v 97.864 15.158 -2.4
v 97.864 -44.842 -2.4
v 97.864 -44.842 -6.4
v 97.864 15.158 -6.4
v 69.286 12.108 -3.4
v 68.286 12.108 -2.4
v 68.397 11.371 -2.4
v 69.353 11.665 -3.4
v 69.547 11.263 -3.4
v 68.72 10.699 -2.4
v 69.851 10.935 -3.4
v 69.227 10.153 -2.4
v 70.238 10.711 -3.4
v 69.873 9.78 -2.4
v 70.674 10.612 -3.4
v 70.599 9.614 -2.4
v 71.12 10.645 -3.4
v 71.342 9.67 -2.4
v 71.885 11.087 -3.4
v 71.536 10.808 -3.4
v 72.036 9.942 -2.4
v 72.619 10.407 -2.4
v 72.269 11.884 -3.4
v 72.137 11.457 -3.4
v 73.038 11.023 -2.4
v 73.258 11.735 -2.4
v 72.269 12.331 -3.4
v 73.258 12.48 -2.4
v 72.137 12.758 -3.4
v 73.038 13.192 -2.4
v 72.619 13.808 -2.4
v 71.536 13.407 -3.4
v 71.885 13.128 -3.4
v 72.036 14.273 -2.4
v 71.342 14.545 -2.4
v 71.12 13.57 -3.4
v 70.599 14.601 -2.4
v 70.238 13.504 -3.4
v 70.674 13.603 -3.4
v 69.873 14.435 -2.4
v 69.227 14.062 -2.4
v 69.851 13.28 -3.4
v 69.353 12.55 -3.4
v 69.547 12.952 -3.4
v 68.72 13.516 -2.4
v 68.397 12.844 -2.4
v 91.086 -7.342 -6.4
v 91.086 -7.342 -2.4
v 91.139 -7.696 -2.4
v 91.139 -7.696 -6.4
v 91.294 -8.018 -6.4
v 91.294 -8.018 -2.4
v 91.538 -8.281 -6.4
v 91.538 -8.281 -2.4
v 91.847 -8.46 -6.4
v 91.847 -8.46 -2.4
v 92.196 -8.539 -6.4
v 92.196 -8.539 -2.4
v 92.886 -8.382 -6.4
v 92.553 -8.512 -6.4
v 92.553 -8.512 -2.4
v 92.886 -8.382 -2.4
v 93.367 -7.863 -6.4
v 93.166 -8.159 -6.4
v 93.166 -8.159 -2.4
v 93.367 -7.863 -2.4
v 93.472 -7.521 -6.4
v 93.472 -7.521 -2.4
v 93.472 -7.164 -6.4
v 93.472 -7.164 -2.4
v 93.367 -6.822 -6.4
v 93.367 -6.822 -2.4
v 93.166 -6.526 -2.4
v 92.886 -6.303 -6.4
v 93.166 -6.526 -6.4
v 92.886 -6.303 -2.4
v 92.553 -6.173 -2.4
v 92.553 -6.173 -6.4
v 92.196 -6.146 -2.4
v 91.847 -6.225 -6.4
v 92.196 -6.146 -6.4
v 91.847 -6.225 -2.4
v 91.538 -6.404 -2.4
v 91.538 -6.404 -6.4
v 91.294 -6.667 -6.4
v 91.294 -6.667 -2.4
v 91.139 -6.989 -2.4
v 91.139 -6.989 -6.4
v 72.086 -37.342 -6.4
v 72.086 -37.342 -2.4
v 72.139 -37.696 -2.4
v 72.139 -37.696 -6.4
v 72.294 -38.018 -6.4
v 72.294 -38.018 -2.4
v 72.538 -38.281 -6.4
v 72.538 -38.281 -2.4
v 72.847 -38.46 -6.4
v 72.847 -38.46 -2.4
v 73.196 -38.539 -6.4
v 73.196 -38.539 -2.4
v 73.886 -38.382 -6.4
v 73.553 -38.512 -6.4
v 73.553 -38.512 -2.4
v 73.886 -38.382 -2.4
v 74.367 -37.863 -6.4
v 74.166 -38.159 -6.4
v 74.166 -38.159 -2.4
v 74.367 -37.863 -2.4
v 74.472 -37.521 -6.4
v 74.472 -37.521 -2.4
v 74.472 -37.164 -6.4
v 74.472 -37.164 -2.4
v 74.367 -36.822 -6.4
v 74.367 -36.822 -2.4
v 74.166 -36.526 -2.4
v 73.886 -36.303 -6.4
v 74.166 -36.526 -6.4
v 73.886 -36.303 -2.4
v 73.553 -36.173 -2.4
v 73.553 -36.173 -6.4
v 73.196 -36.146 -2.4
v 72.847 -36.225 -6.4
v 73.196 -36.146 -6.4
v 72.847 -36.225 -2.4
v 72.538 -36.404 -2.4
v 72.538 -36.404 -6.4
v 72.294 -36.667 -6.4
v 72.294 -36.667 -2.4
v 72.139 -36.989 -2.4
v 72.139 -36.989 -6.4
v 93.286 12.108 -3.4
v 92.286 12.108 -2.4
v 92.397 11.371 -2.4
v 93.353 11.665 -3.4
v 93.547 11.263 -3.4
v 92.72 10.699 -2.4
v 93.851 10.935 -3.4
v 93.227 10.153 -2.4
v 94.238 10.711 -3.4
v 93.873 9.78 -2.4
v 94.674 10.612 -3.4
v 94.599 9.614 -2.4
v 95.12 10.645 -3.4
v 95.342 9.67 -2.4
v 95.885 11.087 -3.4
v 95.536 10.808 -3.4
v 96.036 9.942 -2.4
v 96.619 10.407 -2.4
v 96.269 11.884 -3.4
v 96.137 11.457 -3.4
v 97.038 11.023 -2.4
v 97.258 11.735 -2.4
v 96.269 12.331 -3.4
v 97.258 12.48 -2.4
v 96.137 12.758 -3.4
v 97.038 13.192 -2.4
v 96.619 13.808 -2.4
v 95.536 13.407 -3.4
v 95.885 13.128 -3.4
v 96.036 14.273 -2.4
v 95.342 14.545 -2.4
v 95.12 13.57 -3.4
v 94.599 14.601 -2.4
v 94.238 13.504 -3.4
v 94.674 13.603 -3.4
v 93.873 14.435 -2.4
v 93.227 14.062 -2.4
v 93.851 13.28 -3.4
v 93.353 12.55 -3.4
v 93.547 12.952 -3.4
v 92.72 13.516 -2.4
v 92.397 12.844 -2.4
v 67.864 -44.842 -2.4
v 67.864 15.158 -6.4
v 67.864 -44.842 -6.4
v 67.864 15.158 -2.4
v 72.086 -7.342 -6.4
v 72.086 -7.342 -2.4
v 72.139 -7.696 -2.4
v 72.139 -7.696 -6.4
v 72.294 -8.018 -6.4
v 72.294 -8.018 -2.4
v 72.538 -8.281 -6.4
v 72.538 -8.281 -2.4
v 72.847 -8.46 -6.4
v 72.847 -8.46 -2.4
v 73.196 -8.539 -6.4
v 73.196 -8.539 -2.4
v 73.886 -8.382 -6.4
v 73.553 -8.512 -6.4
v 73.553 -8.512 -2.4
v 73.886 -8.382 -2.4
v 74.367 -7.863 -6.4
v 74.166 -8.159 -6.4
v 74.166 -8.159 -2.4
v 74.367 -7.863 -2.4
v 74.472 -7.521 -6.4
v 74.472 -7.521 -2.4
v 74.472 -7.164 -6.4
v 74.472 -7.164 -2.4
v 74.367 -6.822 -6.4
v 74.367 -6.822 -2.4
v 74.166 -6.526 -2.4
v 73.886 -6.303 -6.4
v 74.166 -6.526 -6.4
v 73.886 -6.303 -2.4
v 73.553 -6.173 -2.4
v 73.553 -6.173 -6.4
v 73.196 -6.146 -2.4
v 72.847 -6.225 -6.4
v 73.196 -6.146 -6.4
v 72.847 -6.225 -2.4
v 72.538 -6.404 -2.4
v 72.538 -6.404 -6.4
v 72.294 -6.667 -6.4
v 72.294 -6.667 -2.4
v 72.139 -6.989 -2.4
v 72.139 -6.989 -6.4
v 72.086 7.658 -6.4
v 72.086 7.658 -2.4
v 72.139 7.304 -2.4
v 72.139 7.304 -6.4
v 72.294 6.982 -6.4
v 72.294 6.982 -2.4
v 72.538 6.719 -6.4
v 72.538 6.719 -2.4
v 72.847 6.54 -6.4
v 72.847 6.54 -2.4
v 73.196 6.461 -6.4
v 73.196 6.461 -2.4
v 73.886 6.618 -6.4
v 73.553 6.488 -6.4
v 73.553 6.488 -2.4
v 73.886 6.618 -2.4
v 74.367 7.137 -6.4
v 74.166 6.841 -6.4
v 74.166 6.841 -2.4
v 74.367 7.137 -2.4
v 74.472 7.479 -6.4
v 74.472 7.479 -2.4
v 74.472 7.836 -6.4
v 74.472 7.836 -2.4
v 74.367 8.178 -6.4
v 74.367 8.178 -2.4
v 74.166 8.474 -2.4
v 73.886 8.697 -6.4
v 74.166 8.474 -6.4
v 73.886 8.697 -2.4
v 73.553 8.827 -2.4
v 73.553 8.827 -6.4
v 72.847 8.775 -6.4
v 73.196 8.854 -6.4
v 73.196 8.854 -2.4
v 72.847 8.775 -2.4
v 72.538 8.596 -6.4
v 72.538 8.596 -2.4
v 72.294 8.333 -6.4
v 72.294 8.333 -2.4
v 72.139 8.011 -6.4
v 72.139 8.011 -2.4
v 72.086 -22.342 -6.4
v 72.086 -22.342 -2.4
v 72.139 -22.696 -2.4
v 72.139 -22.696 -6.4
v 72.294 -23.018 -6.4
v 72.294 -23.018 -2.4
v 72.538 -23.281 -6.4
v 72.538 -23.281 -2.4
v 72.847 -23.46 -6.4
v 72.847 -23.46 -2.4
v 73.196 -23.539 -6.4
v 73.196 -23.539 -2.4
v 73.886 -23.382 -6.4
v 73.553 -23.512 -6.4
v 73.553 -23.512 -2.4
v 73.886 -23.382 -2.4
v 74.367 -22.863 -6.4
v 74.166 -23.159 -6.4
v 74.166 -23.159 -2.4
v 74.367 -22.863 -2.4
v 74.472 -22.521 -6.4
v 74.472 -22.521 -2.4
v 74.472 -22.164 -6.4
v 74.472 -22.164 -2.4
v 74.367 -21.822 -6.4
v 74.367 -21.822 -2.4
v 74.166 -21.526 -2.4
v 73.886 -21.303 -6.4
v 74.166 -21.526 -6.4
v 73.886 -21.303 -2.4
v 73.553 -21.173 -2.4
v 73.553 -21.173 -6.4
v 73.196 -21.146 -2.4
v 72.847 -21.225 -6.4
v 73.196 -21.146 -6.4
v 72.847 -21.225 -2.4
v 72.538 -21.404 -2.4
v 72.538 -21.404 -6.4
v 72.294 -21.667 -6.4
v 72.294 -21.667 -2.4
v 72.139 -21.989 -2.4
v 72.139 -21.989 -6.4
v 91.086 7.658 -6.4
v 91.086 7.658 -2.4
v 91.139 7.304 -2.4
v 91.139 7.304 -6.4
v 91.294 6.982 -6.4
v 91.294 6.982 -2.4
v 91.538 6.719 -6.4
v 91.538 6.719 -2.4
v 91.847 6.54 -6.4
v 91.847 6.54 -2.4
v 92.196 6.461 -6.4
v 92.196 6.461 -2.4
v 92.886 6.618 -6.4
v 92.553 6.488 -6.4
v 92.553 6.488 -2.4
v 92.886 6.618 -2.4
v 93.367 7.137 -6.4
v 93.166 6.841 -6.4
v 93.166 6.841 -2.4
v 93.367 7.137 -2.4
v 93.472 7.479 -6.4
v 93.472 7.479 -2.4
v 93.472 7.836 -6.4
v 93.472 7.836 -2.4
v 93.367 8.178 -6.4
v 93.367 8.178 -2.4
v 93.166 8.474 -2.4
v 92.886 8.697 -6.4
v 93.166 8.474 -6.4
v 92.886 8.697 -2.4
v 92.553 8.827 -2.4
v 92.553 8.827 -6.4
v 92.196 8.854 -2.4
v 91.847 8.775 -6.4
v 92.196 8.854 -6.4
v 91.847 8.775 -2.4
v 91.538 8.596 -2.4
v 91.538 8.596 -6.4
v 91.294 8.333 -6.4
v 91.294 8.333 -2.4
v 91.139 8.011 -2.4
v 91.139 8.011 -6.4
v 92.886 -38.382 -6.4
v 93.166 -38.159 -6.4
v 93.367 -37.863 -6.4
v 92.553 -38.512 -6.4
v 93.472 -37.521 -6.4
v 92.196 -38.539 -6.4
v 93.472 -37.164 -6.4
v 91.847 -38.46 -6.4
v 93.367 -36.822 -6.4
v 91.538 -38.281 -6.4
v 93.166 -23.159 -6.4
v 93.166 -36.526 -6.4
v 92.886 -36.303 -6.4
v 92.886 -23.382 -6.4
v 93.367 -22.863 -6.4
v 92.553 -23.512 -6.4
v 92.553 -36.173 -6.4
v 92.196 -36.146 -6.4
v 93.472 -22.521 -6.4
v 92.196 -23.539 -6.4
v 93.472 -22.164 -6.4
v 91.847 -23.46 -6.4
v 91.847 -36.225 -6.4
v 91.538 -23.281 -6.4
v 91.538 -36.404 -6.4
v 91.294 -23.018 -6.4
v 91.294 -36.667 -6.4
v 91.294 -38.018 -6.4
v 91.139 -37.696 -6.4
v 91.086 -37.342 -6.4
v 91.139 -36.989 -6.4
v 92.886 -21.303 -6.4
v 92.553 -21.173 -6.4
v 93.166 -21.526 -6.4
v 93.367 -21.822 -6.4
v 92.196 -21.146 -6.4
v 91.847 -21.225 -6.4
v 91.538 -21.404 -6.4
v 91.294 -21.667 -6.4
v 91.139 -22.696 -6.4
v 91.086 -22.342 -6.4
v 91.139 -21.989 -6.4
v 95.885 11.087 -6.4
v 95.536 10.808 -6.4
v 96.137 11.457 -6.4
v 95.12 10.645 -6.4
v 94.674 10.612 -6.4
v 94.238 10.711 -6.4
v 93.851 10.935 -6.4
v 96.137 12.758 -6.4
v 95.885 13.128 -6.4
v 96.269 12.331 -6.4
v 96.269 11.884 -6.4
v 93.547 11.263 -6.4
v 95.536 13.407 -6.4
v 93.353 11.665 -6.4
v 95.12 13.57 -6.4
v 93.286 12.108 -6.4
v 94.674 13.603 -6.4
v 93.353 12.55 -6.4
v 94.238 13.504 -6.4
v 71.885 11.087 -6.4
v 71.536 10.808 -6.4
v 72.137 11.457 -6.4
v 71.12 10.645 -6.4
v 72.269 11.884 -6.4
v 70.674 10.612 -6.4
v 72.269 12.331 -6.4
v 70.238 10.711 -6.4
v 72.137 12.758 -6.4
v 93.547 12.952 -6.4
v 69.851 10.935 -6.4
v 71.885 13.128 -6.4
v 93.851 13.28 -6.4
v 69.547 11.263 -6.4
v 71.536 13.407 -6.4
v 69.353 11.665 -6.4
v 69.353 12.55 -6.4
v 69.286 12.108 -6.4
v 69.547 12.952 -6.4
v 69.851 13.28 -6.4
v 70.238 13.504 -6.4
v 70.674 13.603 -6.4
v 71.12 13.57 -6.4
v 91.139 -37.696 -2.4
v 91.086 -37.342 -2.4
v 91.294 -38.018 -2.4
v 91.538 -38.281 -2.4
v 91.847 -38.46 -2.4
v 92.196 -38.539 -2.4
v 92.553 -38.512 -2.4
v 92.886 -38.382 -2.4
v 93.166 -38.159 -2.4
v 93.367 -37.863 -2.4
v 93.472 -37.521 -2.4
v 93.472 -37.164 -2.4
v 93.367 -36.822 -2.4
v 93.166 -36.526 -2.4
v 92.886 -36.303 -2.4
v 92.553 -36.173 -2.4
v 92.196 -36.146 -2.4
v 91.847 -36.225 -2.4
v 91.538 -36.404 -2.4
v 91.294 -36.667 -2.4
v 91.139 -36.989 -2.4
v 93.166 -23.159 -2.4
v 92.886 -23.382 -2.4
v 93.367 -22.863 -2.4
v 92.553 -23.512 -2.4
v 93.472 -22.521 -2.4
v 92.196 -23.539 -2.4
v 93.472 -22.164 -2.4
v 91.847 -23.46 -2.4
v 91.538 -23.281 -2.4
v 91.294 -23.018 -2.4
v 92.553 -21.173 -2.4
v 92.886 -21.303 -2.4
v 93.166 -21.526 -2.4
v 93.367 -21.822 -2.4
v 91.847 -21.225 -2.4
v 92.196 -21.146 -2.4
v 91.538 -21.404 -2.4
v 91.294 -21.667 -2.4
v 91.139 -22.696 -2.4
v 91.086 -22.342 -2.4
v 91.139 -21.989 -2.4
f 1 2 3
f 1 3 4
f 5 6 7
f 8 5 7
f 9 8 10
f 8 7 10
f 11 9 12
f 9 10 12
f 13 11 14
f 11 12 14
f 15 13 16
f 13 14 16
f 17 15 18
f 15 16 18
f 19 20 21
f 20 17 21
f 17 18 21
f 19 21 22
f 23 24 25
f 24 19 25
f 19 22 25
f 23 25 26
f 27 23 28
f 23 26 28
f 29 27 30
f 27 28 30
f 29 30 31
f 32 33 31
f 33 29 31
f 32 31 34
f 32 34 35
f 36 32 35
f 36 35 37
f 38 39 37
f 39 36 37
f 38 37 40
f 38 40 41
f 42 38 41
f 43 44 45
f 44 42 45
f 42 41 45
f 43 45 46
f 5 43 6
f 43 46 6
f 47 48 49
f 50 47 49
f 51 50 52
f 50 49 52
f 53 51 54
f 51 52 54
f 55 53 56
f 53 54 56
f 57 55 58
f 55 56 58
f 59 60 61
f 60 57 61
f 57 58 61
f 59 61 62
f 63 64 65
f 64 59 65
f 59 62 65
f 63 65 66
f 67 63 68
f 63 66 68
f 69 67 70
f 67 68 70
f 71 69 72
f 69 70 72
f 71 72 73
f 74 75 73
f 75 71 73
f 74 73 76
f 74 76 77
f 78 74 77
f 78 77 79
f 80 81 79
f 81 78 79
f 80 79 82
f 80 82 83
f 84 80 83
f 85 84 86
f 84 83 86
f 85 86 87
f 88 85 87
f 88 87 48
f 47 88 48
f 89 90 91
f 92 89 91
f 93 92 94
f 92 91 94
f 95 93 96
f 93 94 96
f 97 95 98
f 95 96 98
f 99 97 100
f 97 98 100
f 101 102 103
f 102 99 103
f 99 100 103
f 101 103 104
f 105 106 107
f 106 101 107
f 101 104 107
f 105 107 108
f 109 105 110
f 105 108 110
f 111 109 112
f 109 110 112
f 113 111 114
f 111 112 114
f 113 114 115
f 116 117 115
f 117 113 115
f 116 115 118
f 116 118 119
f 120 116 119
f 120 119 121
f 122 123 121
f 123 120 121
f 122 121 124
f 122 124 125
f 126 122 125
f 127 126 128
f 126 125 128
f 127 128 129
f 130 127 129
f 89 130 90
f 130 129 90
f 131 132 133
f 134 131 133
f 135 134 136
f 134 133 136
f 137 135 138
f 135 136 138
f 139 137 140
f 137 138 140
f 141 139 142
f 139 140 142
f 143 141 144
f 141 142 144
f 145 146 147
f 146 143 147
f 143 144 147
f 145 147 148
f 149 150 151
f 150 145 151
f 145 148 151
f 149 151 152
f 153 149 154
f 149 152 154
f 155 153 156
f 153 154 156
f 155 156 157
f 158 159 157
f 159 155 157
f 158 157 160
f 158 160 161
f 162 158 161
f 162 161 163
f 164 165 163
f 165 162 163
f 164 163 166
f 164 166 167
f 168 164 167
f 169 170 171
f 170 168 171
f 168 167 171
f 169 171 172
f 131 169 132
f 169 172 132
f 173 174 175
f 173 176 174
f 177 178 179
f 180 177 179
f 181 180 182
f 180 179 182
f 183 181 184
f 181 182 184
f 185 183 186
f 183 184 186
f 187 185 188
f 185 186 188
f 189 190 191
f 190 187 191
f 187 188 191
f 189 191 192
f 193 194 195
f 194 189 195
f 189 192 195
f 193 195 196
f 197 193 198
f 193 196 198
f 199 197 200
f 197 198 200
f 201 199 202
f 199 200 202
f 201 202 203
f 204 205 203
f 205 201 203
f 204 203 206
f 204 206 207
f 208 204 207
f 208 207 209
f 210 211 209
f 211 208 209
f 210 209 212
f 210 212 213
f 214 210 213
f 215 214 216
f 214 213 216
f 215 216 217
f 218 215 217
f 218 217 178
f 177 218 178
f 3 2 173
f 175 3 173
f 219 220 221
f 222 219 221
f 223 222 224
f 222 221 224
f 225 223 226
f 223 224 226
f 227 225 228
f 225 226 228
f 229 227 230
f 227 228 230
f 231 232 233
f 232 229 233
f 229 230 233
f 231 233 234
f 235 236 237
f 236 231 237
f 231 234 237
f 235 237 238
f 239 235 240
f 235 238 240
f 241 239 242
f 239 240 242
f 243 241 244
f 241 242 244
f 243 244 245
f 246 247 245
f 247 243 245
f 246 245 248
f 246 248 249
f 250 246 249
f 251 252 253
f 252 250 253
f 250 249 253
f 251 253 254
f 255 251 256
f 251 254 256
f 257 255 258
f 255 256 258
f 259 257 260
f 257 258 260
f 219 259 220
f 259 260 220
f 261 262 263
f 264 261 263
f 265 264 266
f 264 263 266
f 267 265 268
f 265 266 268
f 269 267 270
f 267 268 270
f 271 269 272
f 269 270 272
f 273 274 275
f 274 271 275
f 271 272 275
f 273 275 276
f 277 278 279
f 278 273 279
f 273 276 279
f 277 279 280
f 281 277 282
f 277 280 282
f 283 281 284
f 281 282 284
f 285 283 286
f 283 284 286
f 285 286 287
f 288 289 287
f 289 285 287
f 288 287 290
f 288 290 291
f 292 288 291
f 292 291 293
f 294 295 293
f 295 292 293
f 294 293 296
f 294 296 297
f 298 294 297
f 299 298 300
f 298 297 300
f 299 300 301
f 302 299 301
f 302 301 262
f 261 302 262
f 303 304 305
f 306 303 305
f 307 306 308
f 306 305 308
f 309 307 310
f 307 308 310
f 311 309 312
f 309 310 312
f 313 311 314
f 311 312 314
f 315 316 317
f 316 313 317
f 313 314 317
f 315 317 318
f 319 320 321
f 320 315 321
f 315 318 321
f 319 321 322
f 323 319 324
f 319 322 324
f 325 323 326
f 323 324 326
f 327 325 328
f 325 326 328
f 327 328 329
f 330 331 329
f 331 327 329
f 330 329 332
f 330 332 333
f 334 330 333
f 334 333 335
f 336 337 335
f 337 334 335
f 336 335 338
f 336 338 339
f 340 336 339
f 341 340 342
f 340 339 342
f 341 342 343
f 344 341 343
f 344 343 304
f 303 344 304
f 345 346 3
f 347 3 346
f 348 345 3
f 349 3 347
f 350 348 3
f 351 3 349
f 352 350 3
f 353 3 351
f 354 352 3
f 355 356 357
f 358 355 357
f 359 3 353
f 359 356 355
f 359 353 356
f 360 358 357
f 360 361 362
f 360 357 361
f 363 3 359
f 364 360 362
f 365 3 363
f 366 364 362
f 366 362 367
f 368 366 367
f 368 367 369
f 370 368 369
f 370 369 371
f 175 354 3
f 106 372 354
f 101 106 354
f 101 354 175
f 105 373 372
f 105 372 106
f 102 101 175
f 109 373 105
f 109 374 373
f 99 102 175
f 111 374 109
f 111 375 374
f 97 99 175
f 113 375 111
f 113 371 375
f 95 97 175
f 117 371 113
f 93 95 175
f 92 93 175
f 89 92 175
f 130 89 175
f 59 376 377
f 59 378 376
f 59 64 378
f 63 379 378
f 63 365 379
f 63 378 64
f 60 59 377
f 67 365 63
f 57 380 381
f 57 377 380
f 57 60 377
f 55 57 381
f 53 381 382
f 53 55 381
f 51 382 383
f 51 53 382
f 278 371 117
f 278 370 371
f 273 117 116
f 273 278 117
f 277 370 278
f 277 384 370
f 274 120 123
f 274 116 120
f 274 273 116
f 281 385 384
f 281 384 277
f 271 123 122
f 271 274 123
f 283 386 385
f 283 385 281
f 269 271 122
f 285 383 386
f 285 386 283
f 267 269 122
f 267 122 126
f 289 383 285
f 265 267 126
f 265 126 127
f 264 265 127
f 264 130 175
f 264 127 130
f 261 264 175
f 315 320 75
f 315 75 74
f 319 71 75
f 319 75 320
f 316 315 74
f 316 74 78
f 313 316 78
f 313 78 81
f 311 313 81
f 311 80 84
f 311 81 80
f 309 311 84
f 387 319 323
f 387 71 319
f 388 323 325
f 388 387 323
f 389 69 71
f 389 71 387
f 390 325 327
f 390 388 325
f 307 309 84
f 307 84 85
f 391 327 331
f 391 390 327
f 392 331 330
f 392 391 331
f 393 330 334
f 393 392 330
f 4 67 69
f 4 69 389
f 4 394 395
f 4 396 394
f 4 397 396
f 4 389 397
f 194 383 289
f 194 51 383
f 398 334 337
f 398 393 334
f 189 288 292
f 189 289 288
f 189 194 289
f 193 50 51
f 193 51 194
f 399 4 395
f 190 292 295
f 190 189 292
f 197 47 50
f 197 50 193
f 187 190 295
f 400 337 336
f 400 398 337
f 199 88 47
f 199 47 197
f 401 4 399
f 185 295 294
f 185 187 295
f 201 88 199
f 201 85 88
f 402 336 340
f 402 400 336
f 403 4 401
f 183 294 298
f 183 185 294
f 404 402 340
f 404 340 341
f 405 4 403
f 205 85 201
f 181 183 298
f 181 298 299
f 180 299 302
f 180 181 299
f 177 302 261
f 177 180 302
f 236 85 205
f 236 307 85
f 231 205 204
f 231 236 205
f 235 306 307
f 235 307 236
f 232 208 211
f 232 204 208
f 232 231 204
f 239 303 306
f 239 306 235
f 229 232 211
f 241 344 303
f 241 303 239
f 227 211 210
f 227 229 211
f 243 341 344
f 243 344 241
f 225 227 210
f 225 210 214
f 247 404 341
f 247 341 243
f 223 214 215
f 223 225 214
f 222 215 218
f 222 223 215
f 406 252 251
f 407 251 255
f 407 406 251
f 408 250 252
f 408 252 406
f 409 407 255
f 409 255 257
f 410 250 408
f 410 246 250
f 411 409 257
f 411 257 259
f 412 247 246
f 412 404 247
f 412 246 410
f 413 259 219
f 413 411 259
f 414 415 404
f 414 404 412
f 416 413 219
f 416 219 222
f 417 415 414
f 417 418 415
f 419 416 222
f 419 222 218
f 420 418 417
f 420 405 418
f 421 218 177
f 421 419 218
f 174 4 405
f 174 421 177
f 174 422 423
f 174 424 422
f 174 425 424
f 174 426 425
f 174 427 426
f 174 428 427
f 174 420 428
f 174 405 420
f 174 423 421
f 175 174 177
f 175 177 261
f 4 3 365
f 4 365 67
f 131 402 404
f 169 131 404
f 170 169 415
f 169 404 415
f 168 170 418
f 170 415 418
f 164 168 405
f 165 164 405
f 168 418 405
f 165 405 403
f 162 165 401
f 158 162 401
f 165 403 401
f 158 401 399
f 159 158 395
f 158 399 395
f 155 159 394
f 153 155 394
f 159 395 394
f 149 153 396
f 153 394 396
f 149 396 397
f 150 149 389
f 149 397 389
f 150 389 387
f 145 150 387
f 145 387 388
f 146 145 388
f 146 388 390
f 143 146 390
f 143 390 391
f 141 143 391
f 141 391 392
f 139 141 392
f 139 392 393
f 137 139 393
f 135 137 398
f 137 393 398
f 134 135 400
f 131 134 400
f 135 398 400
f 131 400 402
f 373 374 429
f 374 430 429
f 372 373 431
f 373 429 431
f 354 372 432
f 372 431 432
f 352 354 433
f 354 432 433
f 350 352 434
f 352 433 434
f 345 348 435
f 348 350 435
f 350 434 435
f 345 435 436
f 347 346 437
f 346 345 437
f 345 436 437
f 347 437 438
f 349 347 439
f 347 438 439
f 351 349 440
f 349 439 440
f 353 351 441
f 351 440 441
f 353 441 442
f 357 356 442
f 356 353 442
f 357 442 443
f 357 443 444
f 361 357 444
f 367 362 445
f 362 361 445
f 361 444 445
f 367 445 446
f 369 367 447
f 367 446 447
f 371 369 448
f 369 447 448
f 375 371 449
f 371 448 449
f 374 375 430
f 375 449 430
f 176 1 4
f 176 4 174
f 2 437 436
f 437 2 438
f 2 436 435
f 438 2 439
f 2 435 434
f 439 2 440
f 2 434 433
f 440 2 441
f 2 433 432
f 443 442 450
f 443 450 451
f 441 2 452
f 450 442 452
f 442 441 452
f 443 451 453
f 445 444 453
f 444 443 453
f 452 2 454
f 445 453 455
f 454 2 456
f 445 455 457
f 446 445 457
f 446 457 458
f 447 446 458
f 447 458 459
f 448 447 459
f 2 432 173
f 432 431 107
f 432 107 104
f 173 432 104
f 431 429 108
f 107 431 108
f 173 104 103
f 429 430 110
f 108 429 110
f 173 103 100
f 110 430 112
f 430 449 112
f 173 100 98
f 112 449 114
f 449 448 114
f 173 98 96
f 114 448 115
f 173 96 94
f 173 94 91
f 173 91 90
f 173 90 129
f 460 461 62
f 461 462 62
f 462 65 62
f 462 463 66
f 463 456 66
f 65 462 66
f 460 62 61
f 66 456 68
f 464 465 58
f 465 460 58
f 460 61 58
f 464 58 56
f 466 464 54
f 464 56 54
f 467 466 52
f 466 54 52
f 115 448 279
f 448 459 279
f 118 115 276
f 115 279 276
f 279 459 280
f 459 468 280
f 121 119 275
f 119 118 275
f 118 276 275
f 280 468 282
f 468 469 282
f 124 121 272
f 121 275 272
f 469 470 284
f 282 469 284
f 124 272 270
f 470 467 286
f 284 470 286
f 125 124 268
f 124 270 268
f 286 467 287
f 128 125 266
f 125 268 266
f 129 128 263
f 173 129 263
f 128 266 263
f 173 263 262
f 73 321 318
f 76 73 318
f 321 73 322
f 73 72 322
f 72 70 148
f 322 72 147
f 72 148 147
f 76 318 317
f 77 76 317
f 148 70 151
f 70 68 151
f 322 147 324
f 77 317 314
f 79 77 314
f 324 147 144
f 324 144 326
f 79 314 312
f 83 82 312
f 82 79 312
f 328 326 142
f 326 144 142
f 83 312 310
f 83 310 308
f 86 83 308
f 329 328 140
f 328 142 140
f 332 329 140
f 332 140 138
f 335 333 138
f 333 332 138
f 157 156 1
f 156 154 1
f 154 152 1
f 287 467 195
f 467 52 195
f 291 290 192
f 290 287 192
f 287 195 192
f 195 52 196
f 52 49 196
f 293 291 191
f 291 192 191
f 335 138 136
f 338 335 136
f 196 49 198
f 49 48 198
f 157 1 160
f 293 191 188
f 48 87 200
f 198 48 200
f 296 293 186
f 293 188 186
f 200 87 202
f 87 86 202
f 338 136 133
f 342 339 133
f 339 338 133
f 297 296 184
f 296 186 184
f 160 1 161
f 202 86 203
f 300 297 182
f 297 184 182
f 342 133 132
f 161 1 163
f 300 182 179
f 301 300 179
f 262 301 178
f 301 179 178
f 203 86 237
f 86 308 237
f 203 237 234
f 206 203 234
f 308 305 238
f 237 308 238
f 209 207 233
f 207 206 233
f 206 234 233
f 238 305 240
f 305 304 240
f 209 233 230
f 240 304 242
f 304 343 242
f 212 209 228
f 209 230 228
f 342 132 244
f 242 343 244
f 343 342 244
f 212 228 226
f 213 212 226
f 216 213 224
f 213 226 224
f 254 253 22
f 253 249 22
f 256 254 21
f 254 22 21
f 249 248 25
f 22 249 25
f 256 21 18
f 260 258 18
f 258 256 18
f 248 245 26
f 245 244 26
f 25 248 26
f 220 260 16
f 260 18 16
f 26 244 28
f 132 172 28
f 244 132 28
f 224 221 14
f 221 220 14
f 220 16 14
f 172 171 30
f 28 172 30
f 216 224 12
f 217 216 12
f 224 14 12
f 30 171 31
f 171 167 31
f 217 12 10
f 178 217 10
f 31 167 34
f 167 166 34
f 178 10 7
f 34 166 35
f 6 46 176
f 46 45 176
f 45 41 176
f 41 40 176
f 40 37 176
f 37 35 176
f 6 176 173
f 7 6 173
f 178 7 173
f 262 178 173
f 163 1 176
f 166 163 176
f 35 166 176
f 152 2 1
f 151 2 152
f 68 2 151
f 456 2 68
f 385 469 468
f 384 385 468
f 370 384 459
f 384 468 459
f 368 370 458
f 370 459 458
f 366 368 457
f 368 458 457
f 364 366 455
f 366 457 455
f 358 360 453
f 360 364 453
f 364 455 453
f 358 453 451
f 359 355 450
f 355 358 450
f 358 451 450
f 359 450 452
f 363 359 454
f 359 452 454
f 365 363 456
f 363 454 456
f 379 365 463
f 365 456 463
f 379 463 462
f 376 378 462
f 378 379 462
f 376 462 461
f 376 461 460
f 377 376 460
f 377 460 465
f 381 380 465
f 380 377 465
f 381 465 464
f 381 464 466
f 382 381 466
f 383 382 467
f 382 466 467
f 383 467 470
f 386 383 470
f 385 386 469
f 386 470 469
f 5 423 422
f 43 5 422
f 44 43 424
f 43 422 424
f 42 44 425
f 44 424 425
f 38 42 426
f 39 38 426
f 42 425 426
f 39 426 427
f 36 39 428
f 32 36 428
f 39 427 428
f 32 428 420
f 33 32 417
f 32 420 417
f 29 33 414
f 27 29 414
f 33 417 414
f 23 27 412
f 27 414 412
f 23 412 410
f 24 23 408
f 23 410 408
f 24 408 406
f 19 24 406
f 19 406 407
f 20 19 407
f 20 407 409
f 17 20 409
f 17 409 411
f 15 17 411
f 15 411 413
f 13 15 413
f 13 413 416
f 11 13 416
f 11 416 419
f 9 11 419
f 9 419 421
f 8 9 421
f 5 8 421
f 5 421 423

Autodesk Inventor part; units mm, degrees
ref_plane "YZ Plane" through (0, 0, 0) normal (1, 0, 0) x (0, 1, 0)
ref_plane "XZ Plane" through (0, 0, 0) normal (0, 1, 0) x (-1, 0, 0)
ref_plane "XY Plane" through (0, 0, 0) normal (0, 0, 1) x (1, 0, 0)
ref_plane "РабПлоскость2" through (101.7859, 42.6575, -2.4) normal (0, 0, -1) x (-1, 0, 0)
sketch "Эскиз2" plane through (101.7859, 42.6575, -2.4) normal (0, 0, -1) x (-1, 0, 0)
  line L0 (6.2, -87.5) -> (12.8, -87.5) projected
  line L1 (12.8, -7.5) -> (12.8, -87.5) projected
  line L2 (6.2, -7.5) -> (6.2, -87.5) projected
  circle A0 centre (9.5, -35) radius 2.3 projected
  circle A1 centre (9.5, -50) radius 2.3 projected
  circle A2 centre (9.5, -65) radius 2.3 projected
  circle A3 centre (9.5, -80) radius 2.3 projected
  line L3 (25.2, -87.5) -> (31.8, -87.5) projected
  line L4 (31.8, -7.5) -> (31.8, -87.5) projected
  line L5 (25.2, -7.5) -> (25.2, -87.5) projected
  circle A4 centre (28.5, -35) radius 2.3 projected
  circle A5 centre (28.5, -50) radius 2.3 projected
  circle A6 centre (28.5, -65) radius 2.3 projected
  circle A7 centre (28.5, -80) radius 2.3 projected
  line L6 (3.9216, -27.5) -> (33.9216, -27.5)
  line L7 (33.9216, -27.5) -> (33.9216, -87.5)
  line L8 (33.9216, -87.5) -> (3.9216, -87.5)
  line L9 (3.9216, -87.5) -> (3.9216, -27.5)
  line L10 (18.9216, -50) -> (18.9216, -69.7785)
  circle A8 centre (9.5, -35) radius 1.2 projected
  circle A9 centre (9.5, -50) radius 1.2 projected
  circle A10 centre (9.5, -65) radius 1.2 projected
  circle A11 centre (9.5, -80) radius 1.2 projected
  circle A12 centre (28.5, -80) radius 1.2 projected
  circle A13 centre (28.5, -65) radius 1.2 projected
  circle A14 centre (28.5, -50) radius 1.2 projected
  circle A15 centre (28.5, -35) radius 2.1 projected
  circle A16 centre (28.5, -35) radius 1.2 projected
  line L11 (25.2, -7.5) -> (31.8, -7.5) projected
  line L12 (6.2, -7.5) -> (12.8, -7.5) projected
  point P0 (101.7859, -42.6575)
  dimension "d3" = 30
  dimension "d4" = 60
  dimension "d5" = 15
extrude "Выдавливание2" add sketch "Эскиз2" along normal blind 4 contours L2 L6 L1 L0 | L8 L9 L6 L2 | L1 L6 L5 L8 | L5 L6 L4 L3 | L4 L6 L7 L8 | A0 | A1 | A2 | A3 | A4 | A5 | A6 | A7 | A15
sketch "Эскиз3" plane through (101.7859, 42.6575, -6.4) normal (0, 0, -1) x (-1, 0, 0)
  circle A0 centre (7, -34.5989) radius 2 projected
  circle A1 centre (31, -34.5989) radius 2 projected
  circle A2 centre (7, -30.55) radius 1.5
  circle A3 centre (31, -30.55) radius 1.5
  circle A4 centre (7, -30.55) radius 1.5
  point P0 (101.7859, -42.6575)
extrude "Выдавливание3" cut sketch "Эскиз3" against normal blind 10 contours A2 | A3
chamfer "Фаска1" distance 1 angle 45 2 edges at (96.2859, 12.1075, -2.4) (72.2859, 12.1075, -2.4)
properties part number "деталь которая двигает"
